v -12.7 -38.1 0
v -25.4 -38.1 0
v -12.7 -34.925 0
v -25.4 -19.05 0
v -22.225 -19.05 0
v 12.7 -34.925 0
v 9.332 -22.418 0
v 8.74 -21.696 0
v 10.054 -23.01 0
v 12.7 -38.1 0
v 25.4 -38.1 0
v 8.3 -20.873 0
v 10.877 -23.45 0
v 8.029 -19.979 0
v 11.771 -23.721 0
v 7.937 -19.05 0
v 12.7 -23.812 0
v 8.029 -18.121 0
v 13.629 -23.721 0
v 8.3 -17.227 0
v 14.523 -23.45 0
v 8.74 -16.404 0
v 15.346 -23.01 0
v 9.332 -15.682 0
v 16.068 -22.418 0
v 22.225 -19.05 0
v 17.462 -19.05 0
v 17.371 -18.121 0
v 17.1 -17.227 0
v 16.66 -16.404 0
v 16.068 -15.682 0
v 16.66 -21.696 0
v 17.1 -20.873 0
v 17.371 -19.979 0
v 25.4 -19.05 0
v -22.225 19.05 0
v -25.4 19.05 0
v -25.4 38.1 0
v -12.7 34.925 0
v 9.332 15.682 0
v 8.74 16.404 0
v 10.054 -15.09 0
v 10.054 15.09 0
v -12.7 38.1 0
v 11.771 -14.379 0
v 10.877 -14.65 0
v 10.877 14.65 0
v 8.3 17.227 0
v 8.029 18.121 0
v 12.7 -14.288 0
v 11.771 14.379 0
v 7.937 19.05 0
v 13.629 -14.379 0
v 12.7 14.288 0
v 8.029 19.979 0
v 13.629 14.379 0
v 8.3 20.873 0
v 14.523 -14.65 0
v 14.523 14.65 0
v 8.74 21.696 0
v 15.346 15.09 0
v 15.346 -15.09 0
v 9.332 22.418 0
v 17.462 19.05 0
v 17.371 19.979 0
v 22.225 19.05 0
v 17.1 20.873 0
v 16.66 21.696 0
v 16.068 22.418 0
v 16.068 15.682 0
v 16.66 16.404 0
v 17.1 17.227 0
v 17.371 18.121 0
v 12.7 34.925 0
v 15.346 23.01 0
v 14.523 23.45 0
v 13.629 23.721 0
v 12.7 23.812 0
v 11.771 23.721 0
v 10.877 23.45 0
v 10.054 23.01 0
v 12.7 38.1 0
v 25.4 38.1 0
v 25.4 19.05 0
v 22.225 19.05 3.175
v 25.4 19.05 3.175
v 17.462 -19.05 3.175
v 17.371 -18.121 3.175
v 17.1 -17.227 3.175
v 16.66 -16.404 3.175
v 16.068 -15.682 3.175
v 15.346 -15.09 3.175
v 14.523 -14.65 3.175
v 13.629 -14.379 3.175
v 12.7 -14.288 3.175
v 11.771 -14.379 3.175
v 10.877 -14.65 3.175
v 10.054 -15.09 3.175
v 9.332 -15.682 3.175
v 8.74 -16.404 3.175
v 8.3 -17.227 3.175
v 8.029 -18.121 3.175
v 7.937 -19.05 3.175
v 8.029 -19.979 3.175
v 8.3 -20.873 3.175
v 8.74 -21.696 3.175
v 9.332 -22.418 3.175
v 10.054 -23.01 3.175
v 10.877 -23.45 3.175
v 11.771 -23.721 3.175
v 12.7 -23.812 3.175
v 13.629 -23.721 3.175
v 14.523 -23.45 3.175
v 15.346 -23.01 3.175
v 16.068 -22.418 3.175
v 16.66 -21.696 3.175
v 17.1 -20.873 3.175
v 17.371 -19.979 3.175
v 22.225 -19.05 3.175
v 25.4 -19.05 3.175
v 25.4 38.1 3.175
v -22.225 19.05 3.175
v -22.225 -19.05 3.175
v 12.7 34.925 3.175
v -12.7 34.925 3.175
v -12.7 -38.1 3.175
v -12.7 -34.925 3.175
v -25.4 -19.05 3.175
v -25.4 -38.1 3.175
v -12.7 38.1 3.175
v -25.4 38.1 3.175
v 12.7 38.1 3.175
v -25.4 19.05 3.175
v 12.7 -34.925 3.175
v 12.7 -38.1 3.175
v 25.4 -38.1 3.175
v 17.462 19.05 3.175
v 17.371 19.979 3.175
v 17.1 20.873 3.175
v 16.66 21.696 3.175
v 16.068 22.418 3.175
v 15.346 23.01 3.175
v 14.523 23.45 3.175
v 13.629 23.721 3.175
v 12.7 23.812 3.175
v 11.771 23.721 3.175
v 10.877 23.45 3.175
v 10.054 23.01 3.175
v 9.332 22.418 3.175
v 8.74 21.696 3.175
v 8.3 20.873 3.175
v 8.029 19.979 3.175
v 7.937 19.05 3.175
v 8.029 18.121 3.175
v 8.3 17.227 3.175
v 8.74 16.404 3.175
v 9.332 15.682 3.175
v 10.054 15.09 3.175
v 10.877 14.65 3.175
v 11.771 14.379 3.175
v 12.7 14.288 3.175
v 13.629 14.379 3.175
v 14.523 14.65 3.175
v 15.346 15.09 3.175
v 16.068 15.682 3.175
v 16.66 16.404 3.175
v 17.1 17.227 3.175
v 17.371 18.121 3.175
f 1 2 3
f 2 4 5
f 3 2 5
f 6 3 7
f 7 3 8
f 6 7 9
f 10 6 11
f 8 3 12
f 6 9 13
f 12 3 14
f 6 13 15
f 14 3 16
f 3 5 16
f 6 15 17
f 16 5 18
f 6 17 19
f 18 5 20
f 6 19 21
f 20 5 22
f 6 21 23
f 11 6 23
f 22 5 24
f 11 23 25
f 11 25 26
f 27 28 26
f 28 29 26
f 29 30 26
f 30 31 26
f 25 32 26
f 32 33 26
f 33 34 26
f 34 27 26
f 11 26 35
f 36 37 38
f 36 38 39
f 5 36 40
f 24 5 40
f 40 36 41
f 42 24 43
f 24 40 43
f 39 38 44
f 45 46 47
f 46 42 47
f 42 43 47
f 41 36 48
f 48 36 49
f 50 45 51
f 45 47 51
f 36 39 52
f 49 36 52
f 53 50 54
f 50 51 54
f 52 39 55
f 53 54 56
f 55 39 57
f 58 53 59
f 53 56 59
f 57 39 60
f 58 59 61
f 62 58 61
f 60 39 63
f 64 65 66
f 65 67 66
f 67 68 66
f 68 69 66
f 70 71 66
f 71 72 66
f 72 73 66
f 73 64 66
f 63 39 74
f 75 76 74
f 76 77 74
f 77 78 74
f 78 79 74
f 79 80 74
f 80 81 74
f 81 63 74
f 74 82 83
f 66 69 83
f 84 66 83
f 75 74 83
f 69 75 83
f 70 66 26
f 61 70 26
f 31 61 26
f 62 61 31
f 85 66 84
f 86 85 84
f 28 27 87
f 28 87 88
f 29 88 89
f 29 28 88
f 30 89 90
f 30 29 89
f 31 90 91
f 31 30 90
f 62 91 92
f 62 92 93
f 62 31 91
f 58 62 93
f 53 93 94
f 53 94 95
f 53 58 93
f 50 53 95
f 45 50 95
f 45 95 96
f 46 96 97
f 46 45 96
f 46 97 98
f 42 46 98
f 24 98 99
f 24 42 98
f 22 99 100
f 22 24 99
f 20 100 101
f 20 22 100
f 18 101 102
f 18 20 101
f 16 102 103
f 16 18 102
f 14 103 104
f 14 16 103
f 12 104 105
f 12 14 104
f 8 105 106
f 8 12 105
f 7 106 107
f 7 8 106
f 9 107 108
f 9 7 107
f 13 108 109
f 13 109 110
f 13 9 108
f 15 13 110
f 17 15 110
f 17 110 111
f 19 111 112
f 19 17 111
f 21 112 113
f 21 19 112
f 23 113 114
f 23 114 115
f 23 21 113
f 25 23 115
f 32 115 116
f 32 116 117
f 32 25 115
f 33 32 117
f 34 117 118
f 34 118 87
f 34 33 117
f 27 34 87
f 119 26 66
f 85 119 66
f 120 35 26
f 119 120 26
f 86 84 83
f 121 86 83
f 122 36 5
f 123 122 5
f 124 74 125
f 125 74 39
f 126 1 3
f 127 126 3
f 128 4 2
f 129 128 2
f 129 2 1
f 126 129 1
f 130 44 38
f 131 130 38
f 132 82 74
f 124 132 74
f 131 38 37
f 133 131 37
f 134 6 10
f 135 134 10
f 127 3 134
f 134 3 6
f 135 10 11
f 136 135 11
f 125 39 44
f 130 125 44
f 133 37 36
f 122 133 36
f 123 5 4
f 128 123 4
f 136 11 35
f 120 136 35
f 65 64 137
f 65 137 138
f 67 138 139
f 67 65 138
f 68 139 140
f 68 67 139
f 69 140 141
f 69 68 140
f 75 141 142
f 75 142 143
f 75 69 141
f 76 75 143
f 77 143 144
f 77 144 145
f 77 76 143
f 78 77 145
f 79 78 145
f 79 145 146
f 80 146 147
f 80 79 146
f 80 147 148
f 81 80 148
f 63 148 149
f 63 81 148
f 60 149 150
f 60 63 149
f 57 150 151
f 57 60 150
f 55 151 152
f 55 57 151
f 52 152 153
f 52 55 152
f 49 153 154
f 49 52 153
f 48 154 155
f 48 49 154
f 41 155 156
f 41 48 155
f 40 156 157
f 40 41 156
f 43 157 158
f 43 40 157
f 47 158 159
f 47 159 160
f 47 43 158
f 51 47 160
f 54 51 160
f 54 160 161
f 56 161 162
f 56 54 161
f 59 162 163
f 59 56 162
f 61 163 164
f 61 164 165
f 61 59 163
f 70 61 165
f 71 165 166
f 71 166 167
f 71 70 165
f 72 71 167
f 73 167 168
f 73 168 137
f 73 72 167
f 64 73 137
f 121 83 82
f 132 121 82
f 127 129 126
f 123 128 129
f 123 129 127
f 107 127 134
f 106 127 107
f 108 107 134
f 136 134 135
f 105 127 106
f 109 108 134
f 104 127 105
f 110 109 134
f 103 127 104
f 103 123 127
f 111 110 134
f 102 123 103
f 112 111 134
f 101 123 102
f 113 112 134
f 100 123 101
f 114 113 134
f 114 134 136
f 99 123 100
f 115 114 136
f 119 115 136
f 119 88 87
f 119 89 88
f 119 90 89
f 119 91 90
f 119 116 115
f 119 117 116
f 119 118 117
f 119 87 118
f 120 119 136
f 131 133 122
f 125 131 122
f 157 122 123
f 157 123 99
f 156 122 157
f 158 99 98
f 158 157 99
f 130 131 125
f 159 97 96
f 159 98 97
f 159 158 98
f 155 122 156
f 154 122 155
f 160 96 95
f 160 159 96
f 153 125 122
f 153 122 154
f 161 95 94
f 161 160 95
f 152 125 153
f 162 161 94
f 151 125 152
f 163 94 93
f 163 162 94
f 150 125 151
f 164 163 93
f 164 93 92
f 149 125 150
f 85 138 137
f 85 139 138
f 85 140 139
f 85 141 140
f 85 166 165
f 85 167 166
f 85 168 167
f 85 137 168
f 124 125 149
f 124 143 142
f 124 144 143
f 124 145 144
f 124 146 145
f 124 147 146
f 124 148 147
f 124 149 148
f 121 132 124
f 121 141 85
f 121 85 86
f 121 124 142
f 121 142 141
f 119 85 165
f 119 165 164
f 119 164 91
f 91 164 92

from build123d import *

# Parameters (mm, degrees)
F0_R     = 4.7625
F1_DEPTH = 3.175


with BuildPart() as f1:
    # F0 (on Top) → F1 (new body)
    with BuildSketch(Plane.XY):
        Polygon((25.4, 19.05), (25.4, 38.1), (12.7, 38.1), (12.7, 34.925), (-12.7, 34.925), (-12.7, 38.1), (-25.4, 38.1), (-25.4, 19.05), (-22.225, 19.05), (-22.225, -19.05), (-25.4, -19.05), (-25.4, -38.1), (-12.7, -38.1), (-12.7, -34.925), (12.7, -34.925), (12.7, -38.1), (25.4, -38.1), (25.4, -19.05), (22.225, -19.05), (22.225, 19.05), align=None)
        with Locations((12.7, -19.05)):
            Circle(F0_R, mode=Mode.SUBTRACT)
        with Locations((12.7, 19.05)):
            Circle(F0_R, mode=Mode.SUBTRACT)
    extrude(amount=F1_DEPTH)


solid = f1.part
